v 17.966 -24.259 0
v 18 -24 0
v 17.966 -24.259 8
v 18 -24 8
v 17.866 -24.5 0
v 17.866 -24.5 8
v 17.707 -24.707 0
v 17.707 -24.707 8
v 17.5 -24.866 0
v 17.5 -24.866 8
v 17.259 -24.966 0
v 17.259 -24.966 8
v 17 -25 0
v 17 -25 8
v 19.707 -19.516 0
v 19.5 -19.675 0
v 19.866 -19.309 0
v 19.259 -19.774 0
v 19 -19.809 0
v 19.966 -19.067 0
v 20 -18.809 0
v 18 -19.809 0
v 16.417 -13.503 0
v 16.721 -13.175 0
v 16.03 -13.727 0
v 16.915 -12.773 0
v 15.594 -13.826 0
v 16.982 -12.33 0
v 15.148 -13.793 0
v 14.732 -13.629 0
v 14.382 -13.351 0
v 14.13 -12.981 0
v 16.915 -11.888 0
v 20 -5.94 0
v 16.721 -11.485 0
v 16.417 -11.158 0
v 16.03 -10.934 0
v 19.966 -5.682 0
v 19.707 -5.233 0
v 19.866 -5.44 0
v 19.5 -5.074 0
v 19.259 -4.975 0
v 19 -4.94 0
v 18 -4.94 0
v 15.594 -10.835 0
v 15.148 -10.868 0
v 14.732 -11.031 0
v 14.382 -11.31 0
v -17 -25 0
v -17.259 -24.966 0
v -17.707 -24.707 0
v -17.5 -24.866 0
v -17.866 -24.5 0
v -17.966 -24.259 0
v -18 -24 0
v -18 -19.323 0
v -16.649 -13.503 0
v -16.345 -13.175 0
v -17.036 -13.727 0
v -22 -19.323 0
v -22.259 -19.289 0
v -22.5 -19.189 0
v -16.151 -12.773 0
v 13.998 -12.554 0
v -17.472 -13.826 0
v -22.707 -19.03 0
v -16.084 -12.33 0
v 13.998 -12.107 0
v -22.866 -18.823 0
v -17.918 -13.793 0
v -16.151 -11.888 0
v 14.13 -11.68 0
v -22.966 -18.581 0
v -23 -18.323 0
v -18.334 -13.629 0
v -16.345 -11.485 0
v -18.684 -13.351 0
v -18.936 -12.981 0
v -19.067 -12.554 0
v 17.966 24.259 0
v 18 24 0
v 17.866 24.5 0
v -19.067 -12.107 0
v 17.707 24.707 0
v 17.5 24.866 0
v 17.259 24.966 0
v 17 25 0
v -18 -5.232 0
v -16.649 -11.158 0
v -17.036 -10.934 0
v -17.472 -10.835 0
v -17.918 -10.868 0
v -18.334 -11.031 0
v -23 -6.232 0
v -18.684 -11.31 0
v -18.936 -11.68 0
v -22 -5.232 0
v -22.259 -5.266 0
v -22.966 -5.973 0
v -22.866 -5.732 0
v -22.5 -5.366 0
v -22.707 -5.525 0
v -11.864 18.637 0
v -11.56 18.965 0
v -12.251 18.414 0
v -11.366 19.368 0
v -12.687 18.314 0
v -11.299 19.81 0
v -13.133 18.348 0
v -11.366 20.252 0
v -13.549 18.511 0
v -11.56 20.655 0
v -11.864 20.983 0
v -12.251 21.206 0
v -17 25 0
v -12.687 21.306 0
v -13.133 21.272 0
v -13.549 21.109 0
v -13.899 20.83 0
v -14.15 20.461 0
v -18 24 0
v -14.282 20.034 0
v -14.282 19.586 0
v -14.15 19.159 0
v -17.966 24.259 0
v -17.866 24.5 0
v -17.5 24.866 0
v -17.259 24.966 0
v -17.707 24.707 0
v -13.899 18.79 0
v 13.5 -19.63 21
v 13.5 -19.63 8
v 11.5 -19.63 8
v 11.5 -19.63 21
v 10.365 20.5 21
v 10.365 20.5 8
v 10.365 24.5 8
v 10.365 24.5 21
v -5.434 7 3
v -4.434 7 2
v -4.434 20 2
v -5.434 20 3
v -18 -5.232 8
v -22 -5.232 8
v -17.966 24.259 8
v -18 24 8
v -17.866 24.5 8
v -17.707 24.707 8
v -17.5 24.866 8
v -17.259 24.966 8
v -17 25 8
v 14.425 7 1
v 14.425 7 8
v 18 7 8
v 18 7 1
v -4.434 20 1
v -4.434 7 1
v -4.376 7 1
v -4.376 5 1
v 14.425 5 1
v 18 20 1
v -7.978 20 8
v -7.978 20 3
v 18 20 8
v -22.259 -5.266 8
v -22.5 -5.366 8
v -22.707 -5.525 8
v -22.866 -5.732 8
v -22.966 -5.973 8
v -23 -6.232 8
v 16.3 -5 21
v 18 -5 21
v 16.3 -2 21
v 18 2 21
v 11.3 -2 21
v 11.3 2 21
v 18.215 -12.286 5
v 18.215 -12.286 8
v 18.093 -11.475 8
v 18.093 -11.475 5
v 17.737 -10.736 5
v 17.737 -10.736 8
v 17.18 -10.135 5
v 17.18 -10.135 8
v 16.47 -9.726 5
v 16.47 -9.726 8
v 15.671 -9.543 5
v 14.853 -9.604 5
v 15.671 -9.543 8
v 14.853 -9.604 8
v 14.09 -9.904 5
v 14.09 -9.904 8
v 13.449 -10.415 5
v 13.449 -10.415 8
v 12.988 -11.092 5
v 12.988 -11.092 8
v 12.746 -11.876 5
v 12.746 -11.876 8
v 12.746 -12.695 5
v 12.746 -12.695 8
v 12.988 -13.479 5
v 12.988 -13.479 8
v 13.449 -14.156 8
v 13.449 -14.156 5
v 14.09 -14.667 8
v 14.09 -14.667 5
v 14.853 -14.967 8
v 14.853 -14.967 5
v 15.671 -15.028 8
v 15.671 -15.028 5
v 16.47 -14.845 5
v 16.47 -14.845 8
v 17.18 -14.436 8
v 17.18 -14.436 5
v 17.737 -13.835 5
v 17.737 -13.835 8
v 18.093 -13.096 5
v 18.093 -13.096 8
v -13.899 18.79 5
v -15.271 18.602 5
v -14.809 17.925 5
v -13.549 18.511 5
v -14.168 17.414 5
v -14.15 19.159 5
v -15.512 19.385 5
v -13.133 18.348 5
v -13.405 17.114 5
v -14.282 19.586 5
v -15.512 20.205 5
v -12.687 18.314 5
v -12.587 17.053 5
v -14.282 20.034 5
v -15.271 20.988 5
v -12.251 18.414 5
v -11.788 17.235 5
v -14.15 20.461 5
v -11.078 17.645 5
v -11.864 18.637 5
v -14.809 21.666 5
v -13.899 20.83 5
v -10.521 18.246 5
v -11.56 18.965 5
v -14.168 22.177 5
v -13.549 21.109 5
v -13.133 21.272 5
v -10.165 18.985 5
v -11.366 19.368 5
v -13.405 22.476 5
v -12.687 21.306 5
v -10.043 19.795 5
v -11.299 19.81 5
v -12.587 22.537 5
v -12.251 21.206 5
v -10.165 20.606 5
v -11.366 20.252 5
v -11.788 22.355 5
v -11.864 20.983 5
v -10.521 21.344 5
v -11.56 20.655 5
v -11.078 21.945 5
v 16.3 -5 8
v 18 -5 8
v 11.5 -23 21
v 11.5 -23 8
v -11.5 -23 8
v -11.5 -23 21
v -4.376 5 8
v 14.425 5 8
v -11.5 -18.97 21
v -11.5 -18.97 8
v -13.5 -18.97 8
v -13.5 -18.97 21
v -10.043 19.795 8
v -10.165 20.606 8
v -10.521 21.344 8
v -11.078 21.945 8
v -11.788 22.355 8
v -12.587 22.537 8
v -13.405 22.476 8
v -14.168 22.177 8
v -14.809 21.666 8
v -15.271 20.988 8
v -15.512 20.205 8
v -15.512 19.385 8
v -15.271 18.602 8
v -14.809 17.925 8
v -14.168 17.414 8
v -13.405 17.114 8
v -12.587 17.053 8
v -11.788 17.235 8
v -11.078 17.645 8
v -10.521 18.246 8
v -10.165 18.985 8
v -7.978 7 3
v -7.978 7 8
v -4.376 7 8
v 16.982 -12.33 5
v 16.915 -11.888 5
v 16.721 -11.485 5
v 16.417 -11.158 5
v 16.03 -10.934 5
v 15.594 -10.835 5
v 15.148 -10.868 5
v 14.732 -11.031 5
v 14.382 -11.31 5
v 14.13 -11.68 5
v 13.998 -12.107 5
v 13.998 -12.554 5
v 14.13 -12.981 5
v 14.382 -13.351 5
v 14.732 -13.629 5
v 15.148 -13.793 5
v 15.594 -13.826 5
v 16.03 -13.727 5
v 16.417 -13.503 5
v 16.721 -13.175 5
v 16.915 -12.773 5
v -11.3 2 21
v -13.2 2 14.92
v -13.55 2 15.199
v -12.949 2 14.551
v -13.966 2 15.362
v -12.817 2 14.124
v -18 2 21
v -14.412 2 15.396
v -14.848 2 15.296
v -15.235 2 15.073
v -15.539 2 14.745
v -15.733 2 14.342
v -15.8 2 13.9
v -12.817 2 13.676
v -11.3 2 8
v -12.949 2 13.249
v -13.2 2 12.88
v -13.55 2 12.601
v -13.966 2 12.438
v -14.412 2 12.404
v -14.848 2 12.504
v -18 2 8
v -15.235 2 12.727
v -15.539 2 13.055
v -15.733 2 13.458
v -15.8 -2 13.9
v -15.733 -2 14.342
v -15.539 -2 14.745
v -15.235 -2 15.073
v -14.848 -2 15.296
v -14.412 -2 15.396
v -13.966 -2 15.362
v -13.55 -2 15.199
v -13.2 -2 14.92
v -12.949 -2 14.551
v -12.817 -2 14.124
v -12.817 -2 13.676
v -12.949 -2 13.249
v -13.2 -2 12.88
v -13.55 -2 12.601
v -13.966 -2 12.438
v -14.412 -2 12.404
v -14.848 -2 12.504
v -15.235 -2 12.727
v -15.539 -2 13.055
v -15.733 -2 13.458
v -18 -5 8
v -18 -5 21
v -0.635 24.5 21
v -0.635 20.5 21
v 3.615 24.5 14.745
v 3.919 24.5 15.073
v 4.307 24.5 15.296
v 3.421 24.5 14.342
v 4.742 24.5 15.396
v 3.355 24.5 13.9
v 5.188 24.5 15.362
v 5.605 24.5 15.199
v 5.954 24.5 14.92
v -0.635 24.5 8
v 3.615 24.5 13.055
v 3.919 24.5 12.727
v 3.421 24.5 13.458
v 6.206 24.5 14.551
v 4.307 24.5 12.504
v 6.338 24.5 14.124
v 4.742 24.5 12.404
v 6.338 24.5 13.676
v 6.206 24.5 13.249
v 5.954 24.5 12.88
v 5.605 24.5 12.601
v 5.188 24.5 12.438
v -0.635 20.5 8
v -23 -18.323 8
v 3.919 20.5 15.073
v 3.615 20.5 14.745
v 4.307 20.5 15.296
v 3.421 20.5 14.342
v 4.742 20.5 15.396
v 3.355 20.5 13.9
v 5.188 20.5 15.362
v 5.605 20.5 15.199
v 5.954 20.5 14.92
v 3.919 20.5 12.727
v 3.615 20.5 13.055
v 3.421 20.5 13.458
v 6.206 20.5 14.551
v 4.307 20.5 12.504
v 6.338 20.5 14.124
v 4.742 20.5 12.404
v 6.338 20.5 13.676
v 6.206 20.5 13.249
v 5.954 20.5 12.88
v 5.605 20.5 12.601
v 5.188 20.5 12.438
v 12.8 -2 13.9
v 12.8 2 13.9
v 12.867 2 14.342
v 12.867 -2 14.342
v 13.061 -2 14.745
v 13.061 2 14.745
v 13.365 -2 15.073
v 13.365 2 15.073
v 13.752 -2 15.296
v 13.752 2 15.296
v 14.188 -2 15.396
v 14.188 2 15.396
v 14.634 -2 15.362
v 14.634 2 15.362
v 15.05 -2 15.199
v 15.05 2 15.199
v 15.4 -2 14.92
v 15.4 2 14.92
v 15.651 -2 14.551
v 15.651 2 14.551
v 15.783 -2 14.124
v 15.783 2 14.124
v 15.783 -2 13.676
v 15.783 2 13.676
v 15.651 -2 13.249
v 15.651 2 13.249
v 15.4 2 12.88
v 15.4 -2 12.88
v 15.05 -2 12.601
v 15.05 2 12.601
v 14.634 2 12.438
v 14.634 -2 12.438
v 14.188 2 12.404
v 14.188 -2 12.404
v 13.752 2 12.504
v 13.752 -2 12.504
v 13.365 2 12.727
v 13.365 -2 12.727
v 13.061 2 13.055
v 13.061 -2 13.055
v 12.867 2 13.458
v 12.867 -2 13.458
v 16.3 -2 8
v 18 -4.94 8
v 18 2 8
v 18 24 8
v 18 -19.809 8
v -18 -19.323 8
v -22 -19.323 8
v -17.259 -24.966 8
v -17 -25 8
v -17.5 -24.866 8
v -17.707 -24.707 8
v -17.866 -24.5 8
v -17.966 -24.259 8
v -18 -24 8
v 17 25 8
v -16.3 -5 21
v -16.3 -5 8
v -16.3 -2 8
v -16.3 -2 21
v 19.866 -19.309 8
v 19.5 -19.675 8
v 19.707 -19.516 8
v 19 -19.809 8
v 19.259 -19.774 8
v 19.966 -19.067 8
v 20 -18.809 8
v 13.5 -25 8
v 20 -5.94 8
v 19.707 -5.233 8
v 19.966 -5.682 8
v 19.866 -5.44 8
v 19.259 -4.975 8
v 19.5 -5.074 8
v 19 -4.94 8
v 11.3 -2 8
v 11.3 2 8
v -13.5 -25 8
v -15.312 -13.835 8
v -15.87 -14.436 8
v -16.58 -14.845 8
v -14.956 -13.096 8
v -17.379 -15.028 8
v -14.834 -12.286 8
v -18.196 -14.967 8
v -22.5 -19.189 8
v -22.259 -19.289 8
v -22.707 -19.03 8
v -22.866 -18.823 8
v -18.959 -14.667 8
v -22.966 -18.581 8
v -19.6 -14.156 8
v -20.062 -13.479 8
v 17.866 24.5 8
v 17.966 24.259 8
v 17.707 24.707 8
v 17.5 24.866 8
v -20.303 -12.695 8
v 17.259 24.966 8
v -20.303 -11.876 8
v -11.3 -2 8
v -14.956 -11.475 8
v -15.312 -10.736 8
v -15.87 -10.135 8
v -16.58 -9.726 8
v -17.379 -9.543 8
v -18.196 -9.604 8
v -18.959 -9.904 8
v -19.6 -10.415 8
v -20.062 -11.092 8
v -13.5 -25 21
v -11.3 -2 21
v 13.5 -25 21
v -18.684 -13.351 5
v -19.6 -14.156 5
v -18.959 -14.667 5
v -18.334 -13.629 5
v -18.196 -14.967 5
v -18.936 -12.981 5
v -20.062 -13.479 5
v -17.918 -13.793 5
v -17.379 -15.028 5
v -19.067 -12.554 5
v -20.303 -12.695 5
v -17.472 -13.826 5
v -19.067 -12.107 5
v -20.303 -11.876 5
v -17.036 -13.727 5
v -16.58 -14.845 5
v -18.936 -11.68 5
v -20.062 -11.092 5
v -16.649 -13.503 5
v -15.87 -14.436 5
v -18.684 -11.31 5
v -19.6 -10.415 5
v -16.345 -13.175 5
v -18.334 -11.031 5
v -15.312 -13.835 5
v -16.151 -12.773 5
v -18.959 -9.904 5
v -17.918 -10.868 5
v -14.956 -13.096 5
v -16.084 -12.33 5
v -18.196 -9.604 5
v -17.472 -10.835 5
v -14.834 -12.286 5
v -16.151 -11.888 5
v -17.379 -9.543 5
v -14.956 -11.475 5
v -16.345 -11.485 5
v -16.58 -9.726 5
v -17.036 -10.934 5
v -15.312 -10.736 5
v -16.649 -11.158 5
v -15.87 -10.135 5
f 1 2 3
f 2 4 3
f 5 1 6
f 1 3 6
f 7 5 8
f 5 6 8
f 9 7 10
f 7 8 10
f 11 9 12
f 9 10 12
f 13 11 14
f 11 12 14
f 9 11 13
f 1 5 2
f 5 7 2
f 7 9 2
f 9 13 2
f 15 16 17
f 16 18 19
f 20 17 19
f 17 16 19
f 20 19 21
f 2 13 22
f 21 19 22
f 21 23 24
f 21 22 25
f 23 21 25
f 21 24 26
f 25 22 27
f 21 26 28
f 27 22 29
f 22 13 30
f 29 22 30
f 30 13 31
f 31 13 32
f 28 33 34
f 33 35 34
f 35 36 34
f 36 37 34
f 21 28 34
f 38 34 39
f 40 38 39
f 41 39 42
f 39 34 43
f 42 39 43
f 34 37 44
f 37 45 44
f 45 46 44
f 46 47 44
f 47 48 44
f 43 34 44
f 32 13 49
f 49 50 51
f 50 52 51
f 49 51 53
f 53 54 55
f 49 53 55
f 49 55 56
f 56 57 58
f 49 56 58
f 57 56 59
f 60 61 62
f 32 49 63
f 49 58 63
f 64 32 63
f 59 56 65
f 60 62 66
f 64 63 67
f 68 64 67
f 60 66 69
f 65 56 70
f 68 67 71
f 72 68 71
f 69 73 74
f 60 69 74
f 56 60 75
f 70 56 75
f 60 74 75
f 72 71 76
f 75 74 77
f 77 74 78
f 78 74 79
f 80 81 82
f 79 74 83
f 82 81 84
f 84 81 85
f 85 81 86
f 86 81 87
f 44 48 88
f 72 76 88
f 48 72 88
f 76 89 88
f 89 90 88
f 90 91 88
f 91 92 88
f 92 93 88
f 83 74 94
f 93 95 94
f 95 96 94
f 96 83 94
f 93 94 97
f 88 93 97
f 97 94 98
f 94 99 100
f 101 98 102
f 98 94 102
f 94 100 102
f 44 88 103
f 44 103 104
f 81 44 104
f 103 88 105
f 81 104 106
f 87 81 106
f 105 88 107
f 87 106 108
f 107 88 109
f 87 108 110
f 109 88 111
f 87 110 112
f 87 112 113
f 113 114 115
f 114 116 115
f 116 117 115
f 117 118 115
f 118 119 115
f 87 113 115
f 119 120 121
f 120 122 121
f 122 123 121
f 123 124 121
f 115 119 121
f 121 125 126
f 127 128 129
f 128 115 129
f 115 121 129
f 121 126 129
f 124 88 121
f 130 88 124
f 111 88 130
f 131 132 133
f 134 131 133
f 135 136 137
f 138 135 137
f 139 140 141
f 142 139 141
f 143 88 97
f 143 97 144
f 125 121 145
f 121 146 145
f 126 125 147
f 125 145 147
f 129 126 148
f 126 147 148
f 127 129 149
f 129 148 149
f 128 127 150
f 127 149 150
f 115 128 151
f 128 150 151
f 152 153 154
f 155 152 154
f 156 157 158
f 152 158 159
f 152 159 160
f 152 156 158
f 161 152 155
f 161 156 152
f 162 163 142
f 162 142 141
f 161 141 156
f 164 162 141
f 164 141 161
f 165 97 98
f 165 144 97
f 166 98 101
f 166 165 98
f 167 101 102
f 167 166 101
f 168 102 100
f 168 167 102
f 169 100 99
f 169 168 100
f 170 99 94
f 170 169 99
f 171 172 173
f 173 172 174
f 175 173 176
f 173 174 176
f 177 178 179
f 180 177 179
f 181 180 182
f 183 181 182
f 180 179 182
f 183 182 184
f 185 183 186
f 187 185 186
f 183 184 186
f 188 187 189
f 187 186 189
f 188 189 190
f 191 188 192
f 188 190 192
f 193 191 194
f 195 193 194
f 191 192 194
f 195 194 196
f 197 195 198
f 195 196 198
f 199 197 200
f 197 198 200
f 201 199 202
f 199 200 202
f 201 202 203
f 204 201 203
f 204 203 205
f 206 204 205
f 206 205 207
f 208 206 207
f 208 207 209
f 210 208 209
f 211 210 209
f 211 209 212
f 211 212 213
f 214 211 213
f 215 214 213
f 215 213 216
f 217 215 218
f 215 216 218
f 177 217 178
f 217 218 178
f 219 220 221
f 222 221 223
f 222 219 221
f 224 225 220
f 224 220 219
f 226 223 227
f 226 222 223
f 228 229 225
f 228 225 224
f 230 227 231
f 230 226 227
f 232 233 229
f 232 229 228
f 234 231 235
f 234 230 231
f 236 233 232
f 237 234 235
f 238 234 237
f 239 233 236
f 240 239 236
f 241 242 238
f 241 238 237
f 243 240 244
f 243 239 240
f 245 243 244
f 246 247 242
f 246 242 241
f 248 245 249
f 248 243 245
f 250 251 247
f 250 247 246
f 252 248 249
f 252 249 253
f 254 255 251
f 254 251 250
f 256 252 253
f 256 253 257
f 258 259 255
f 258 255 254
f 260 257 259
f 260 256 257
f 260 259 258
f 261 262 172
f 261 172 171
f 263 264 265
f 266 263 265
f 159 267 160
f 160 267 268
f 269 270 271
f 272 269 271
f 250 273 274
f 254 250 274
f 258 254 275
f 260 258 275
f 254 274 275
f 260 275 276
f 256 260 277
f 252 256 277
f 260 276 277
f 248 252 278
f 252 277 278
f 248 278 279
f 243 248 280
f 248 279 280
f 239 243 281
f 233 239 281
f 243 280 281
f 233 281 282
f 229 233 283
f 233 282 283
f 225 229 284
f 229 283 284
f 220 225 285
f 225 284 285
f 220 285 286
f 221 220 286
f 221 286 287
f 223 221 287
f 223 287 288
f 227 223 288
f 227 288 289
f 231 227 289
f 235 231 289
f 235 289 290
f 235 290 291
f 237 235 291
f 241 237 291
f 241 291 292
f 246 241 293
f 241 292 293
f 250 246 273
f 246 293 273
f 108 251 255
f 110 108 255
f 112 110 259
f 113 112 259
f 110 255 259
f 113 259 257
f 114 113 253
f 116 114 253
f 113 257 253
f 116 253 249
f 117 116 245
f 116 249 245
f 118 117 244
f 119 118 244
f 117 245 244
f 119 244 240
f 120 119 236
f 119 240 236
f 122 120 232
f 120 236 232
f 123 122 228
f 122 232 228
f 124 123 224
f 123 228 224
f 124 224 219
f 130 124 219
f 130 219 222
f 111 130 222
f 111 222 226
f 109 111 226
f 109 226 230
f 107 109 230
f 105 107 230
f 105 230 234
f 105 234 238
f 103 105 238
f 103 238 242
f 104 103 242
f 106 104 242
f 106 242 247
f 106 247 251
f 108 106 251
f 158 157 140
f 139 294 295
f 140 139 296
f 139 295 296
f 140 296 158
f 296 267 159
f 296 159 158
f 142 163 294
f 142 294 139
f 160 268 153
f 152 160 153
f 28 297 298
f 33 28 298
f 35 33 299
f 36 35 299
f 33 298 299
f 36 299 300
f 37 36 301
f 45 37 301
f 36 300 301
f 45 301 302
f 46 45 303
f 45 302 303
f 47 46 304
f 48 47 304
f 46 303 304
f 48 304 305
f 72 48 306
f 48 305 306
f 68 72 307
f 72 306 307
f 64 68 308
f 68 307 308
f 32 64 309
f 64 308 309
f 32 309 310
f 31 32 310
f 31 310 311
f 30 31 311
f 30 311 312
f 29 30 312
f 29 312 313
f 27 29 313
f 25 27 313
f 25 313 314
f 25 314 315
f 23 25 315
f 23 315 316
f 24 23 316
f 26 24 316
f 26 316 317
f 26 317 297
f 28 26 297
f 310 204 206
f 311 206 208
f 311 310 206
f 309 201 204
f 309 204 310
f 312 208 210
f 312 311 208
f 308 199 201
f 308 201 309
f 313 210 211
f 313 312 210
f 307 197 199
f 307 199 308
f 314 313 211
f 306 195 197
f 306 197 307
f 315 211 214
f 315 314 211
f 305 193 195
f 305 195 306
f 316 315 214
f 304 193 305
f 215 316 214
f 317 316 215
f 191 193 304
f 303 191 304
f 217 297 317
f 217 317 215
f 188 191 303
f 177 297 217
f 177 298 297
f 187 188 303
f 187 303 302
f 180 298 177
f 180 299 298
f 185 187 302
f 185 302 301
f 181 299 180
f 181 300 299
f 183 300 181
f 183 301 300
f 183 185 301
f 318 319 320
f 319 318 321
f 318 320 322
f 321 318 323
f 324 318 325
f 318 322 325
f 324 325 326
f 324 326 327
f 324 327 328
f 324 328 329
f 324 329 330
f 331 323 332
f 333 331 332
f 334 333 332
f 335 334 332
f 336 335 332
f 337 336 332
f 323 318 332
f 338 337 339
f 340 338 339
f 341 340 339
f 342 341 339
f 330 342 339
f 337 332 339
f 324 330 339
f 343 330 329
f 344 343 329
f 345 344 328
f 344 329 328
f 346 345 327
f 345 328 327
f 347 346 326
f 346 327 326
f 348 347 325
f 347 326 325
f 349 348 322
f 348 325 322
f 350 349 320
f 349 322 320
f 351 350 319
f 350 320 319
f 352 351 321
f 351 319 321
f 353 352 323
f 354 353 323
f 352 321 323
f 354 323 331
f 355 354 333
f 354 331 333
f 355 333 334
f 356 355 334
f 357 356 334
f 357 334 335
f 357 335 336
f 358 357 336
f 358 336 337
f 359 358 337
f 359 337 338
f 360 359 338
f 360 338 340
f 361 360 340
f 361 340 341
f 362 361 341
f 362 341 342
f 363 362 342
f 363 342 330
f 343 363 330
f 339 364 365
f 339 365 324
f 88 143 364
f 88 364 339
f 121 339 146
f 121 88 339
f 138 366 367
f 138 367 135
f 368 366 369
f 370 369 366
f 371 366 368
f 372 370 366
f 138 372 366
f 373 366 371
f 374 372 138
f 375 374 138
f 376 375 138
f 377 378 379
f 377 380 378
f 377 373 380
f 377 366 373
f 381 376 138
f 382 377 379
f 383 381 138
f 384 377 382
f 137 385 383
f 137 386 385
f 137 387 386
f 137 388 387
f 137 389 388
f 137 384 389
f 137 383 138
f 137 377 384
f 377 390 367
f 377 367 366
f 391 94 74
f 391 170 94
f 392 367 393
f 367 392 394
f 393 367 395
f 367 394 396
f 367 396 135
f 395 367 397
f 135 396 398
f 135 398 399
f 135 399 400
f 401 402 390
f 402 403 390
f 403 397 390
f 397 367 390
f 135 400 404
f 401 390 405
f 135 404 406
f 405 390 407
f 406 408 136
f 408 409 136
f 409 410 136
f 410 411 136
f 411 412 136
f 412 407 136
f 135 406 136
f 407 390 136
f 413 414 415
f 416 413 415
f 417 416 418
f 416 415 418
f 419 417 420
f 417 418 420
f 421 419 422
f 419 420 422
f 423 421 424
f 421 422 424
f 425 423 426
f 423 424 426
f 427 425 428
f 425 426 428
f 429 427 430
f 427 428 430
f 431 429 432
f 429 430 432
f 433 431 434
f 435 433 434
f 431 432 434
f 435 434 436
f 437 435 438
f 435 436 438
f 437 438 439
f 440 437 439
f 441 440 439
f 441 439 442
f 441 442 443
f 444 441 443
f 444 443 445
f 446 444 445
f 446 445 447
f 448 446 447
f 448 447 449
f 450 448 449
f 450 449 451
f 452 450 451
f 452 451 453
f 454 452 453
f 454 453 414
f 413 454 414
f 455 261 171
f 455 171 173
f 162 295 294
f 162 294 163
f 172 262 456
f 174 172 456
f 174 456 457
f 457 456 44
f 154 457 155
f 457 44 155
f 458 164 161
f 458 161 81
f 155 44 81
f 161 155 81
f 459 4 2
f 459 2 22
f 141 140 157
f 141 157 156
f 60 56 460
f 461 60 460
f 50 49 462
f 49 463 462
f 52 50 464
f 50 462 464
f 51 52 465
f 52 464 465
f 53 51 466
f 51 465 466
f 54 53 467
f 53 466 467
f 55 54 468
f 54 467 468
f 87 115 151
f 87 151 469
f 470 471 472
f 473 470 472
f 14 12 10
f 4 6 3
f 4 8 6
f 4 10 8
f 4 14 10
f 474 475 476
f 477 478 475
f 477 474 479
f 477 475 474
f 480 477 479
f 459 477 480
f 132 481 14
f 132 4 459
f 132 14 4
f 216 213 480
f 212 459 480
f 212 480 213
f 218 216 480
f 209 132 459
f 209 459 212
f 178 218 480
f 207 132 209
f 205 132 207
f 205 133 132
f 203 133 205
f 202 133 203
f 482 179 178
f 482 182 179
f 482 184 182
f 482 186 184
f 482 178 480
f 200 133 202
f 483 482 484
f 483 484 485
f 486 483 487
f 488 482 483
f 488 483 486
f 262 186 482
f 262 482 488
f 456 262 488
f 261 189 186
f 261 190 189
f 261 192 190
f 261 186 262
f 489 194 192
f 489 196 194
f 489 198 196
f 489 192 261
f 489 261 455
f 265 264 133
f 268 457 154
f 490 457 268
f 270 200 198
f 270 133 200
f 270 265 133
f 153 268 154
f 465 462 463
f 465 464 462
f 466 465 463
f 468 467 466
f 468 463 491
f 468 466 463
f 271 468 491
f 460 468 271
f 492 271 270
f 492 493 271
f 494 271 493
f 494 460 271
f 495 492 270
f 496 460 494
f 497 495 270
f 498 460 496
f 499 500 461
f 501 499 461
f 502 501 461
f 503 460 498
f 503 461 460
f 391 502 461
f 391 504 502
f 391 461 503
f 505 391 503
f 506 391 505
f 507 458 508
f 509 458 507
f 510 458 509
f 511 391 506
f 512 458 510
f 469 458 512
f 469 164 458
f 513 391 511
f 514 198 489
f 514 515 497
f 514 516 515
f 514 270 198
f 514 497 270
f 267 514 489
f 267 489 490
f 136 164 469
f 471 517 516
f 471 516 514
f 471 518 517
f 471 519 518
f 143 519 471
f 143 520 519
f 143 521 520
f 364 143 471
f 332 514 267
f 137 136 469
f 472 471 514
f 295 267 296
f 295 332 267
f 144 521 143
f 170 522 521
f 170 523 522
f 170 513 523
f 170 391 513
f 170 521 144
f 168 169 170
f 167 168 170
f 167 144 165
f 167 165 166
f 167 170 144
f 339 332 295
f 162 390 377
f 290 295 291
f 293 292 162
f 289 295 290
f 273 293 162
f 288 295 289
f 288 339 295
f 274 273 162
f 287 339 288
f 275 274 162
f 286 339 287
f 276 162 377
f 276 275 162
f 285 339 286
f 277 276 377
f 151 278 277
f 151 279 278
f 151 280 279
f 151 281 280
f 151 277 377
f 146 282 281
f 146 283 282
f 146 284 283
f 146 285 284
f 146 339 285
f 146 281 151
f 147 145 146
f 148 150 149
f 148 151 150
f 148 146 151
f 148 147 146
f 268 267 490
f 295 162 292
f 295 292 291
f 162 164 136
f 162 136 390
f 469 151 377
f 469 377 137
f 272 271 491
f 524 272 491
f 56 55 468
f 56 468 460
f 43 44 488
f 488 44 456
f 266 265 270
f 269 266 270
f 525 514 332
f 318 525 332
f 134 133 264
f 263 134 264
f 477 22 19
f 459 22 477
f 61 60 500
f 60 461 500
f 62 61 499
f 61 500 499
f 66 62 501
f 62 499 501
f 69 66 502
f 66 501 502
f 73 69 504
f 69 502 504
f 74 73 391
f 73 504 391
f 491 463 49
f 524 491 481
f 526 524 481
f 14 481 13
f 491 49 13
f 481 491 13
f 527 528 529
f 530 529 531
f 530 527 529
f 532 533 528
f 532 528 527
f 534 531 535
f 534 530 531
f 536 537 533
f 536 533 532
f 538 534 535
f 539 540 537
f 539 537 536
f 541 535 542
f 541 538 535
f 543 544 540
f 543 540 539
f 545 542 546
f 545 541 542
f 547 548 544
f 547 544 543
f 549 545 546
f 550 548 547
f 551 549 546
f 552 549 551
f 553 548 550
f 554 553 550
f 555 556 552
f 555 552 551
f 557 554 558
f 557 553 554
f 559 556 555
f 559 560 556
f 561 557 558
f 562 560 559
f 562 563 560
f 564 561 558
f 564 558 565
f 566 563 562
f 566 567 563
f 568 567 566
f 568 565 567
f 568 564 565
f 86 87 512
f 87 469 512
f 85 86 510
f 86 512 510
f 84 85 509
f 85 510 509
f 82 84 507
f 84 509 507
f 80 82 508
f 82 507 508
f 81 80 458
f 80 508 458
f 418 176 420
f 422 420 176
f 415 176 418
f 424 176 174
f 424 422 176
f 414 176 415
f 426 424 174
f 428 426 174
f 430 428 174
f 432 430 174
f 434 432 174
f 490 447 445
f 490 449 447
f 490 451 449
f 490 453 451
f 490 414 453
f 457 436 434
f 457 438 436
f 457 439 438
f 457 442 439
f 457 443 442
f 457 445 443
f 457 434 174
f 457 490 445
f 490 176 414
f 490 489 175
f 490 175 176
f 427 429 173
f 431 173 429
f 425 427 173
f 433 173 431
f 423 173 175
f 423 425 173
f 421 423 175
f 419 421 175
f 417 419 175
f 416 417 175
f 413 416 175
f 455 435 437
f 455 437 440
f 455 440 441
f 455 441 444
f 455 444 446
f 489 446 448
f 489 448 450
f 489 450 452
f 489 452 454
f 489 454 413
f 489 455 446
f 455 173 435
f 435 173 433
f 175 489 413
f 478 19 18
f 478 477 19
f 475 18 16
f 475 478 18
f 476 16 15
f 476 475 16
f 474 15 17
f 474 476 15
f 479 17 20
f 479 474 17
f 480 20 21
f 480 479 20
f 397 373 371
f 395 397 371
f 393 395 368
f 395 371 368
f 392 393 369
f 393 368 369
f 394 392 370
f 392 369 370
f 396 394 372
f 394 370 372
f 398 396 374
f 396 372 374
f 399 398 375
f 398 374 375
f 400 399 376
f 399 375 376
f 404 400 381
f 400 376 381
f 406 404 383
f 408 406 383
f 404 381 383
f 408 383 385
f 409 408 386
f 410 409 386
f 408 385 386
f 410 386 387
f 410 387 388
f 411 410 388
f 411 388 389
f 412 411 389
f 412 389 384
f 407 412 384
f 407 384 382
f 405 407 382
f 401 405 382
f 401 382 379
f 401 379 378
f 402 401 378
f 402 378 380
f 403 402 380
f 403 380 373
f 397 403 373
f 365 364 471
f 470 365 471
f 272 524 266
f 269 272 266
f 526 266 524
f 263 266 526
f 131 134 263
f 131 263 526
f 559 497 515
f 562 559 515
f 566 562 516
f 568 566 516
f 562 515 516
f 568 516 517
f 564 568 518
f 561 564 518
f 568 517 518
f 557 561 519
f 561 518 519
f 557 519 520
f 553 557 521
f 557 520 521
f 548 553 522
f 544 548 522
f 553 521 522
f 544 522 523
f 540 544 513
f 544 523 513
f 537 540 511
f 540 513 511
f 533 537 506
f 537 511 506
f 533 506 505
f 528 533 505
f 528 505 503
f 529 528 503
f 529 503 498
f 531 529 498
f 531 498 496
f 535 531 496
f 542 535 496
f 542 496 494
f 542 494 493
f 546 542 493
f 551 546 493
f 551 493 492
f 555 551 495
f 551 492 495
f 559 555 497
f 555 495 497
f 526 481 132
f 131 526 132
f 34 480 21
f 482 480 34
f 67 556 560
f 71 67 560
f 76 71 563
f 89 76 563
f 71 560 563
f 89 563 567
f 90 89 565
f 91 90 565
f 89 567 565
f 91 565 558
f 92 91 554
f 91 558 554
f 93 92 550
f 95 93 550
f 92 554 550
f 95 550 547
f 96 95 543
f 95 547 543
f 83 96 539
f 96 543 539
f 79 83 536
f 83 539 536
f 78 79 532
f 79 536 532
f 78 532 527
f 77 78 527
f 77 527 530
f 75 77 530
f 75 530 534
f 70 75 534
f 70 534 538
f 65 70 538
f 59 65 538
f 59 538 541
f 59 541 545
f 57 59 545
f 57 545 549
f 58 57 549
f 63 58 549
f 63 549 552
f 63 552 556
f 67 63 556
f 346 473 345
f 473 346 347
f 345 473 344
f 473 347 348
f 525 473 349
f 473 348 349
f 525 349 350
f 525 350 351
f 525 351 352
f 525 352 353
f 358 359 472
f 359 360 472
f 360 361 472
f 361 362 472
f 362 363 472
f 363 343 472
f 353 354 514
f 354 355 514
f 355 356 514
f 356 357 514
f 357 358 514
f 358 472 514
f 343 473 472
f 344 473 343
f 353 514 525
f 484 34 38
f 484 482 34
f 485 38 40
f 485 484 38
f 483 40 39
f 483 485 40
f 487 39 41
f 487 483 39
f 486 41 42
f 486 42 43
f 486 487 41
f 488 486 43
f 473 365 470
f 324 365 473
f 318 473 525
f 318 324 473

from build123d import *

# Parameters (mm, degrees)
SKETCH_W        = 36
SKETCH_H        = 50
PAD_DEPTH       = 8
PAD001_DEPTH    = 13
SKETCH004_W     = 11
SKETCH004_H     = 4
PAD003_DEPTH    = 13
PAD002_DEPTH    = 13
SKETCH005_W     = 25.977524
SKETCH005_H     = 13
POCKET_DEPTH    = 5
SKETCH006_R     = 1.5
POCKET001_DEPTH = 5
SKETCH007_R     = 1.5
POCKET002_DEPTH = 5
CHAMFER_SIZE    = 2
CHAMFER001_SIZE = 2
CHAMFER002_SIZE = 3
CHAMFER003_SIZE = 2
SKETCH008_W     = 23.210894
SKETCH008_H     = 13
POCKET003_DEPTH = 2
CHAMFER004_SIZE = 1
SKETCH009_W     = 14.868066
SKETCH009_H     = 8
PAD004_DEPTH    = 2
FILLET_R        = 1
FILLET001_R     = 1
FILLET002_R     = 1
SKETCH011_W     = 14.090648
SKETCH011_H     = 8
PAD005_DEPTH    = 5
FILLET003_R     = 1
SKETCH012_R     = 1.5
POCKET004_DEPTH = 8.001
SKETCH013_R     = 2.75
POCKET005_DEPTH = 3
SKETCH014_W     = 18.80099
SKETCH014_H     = 2
POCKET006_DEPTH = 7


with BuildPart() as pad003:
    # Sketch → Pad (new body)
    with BuildSketch(Plane.XY):
        Rectangle(SKETCH_W, SKETCH_H)
    extrude(amount=PAD_DEPTH)

    # Sketch002 → Pad001 (new body)
    with BuildSketch(Plane.XY.offset(8)):
        Polygon((-13.5, -25), (13.5, -25), (13.5, -19.629501), (11.5, -19.629501), (11.5, -23), (-11.5, -23), (-11.5, -18.969727), (-13.5, -18.969727), align=None)
    extrude(amount=PAD001_DEPTH)

    # Sketch004 → Pad003 (new body)
    with BuildSketch(Plane.XY.offset(8)):
        with Locations((4.8652, 22.5)):
            Rectangle(SKETCH004_W, SKETCH004_H)
    extrude(amount=PAD003_DEPTH)


with BuildPart() as pocket006:
    # Sketch003 → Pad002 (new body)
    with BuildSketch(Plane.XY.offset(8)):
        Polygon((11.3, 2), (18, 2), (18, -5), (16.3, -5), (16.3, -2), (11.3, -2), align=None)
        Polygon((-11.3, 2), (-18, 2), (-18, -5), (-16.3, -5), (-16.3, -2), (-11.3, -2), align=None)
    extrude(amount=PAD002_DEPTH)

    # Fusion: union Pad003
    add(pad003.part)

    # Sketch005 → Pocket (cut)
    with BuildSketch(Plane.XY.offset(8)):
        with Locations((5.011238, 13.5)):
            Rectangle(SKETCH005_W, SKETCH005_H)
    extrude(amount=-POCKET_DEPTH, mode=Mode.SUBTRACT)

    # Sketch006 → Pocket001 (cut)
    with BuildSketch(Plane(origin=(0, 2, 0), x_dir=(-1, 0, 0), z_dir=(0, 1, 0))):
        with Locations((-14.3, 13.9)):
            Circle(SKETCH006_R)
        with Locations((14.3, 13.9)):
            Circle(SKETCH006_R)
    extrude(amount=-POCKET001_DEPTH, mode=Mode.SUBTRACT)

    # Sketch007 → Pocket002 (cut)
    with BuildSketch(Plane(origin=(0, 24.5, 0), x_dir=(-1, 0, 0), z_dir=(0, 1, 0))):
        with Locations((-4.854515, 13.9)):
            Circle(SKETCH007_R)
    extrude(amount=-POCKET002_DEPTH, mode=Mode.SUBTRACT)

    # Chamfer
    chamfer_edges = [pocket006.edges().sort_by_distance(p)[0] for p in [
        (18, 13.5, 3),
    ]]
    chamfer(chamfer_edges, length=CHAMFER_SIZE)

    # Chamfer001
    chamfer001_edges = [pocket006.edges().sort_by_distance(p)[0] for p in [
        (16, 13.5, 3),
    ]]
    chamfer(chamfer001_edges, length=CHAMFER001_SIZE)

    # Chamfer002
    chamfer002_edges = [pocket006.edges().sort_by_distance(p)[0] for p in [
        (14, 13.5, 3),
    ]]
    chamfer(chamfer002_edges, length=CHAMFER002_SIZE)

    # Chamfer003
    chamfer003_edges = [pocket006.edges().sort_by_distance(p)[0] for p in [
        (11, 13.5, 3),
    ]]
    chamfer(chamfer003_edges, length=CHAMFER003_SIZE)

    # Sketch008 → Pocket003 (cut)
    with BuildSketch(Plane.XY.offset(3)):
        with Locations((7.17125, 13.5)):
            Rectangle(SKETCH008_W, SKETCH008_H)
    extrude(amount=-POCKET003_DEPTH, mode=Mode.SUBTRACT)

    # Chamfer004
    chamfer004_edges = [pocket006.edges().sort_by_distance(p)[0] for p in [
        (-4.434197, 13.5, 3),
    ]]
    chamfer(chamfer004_edges, length=CHAMFER004_SIZE)

    # Sketch009 → Pad004 (new body)
    with BuildSketch(Plane.YZ.offset(18)):
        with Locations((-12.37453, 4)):
            Rectangle(SKETCH009_W, SKETCH009_H)
    extrude(amount=PAD004_DEPTH)

    # Fillet
    fillet_edges = [pocket006.edges().sort_by_distance(p)[0] for p in [
        (20, -19.808563, 4),
        (20, -4.940497, 4),
    ]]
    fillet(fillet_edges, radius=FILLET_R)

    # Fillet001
    fillet001_edges = [pocket006.edges().sort_by_distance(p)[0] for p in [
        (18, -25, 4),
        (18, 25, 4),
    ]]
    fillet(fillet001_edges, radius=FILLET001_R)

    # Fillet002
    fillet002_edges = [pocket006.edges().sort_by_distance(p)[0] for p in [
        (-18, 25, 4),
        (-18, -25, 4),
    ]]
    fillet(fillet002_edges, radius=FILLET002_R)

    # Sketch011 → Pad005 (new body)
    with BuildSketch(Plane(origin=(-18, 0, 0), x_dir=(0, -1, 0), z_dir=(-1, 0, 0))):
        with Locations((12.277352, 4)):
            Rectangle(SKETCH011_W, SKETCH011_H)
    extrude(amount=PAD005_DEPTH)

    # Fillet003
    fillet003_edges = [pocket006.edges().sort_by_distance(p)[0] for p in [
        (-23, -5.232028, 4),
        (-23, -19.322676, 4),
    ]]
    fillet(fillet003_edges, radius=FILLET003_R)

    # Sketch012 → Pocket004 (cut, through all)
    with BuildSketch(Plane.XY.offset(8)):
        with Locations((-17.58419, -12.3304)):
            Circle(SKETCH012_R)
        with Locations((15.481561, -12.3304)):
            Circle(SKETCH012_R)
        with Locations((-12.798991, 19.810022)):
            Circle(SKETCH012_R)
    extrude(amount=-POCKET004_DEPTH, mode=Mode.SUBTRACT)

    # Sketch013 → Pocket005 (cut)
    with BuildSketch(Plane.XY.offset(8)):
        with Locations((-17.584191, -12.2855)):
            Circle(SKETCH013_R)
        with Locations((15.465243, -12.2855)):
            Circle(SKETCH013_R)
        with Locations((-12.792856, 19.795126)):
            Circle(SKETCH013_R)
    extrude(amount=-POCKET005_DEPTH, mode=Mode.SUBTRACT)

    # Sketch014 → Pocket006 (cut)
    with BuildSketch(Plane.XY.offset(8)):
        with Locations((5.024045, 6)):
            Rectangle(SKETCH014_W, SKETCH014_H)
    extrude(amount=-POCKET006_DEPTH, mode=Mode.SUBTRACT)


solid = pocket006.part
